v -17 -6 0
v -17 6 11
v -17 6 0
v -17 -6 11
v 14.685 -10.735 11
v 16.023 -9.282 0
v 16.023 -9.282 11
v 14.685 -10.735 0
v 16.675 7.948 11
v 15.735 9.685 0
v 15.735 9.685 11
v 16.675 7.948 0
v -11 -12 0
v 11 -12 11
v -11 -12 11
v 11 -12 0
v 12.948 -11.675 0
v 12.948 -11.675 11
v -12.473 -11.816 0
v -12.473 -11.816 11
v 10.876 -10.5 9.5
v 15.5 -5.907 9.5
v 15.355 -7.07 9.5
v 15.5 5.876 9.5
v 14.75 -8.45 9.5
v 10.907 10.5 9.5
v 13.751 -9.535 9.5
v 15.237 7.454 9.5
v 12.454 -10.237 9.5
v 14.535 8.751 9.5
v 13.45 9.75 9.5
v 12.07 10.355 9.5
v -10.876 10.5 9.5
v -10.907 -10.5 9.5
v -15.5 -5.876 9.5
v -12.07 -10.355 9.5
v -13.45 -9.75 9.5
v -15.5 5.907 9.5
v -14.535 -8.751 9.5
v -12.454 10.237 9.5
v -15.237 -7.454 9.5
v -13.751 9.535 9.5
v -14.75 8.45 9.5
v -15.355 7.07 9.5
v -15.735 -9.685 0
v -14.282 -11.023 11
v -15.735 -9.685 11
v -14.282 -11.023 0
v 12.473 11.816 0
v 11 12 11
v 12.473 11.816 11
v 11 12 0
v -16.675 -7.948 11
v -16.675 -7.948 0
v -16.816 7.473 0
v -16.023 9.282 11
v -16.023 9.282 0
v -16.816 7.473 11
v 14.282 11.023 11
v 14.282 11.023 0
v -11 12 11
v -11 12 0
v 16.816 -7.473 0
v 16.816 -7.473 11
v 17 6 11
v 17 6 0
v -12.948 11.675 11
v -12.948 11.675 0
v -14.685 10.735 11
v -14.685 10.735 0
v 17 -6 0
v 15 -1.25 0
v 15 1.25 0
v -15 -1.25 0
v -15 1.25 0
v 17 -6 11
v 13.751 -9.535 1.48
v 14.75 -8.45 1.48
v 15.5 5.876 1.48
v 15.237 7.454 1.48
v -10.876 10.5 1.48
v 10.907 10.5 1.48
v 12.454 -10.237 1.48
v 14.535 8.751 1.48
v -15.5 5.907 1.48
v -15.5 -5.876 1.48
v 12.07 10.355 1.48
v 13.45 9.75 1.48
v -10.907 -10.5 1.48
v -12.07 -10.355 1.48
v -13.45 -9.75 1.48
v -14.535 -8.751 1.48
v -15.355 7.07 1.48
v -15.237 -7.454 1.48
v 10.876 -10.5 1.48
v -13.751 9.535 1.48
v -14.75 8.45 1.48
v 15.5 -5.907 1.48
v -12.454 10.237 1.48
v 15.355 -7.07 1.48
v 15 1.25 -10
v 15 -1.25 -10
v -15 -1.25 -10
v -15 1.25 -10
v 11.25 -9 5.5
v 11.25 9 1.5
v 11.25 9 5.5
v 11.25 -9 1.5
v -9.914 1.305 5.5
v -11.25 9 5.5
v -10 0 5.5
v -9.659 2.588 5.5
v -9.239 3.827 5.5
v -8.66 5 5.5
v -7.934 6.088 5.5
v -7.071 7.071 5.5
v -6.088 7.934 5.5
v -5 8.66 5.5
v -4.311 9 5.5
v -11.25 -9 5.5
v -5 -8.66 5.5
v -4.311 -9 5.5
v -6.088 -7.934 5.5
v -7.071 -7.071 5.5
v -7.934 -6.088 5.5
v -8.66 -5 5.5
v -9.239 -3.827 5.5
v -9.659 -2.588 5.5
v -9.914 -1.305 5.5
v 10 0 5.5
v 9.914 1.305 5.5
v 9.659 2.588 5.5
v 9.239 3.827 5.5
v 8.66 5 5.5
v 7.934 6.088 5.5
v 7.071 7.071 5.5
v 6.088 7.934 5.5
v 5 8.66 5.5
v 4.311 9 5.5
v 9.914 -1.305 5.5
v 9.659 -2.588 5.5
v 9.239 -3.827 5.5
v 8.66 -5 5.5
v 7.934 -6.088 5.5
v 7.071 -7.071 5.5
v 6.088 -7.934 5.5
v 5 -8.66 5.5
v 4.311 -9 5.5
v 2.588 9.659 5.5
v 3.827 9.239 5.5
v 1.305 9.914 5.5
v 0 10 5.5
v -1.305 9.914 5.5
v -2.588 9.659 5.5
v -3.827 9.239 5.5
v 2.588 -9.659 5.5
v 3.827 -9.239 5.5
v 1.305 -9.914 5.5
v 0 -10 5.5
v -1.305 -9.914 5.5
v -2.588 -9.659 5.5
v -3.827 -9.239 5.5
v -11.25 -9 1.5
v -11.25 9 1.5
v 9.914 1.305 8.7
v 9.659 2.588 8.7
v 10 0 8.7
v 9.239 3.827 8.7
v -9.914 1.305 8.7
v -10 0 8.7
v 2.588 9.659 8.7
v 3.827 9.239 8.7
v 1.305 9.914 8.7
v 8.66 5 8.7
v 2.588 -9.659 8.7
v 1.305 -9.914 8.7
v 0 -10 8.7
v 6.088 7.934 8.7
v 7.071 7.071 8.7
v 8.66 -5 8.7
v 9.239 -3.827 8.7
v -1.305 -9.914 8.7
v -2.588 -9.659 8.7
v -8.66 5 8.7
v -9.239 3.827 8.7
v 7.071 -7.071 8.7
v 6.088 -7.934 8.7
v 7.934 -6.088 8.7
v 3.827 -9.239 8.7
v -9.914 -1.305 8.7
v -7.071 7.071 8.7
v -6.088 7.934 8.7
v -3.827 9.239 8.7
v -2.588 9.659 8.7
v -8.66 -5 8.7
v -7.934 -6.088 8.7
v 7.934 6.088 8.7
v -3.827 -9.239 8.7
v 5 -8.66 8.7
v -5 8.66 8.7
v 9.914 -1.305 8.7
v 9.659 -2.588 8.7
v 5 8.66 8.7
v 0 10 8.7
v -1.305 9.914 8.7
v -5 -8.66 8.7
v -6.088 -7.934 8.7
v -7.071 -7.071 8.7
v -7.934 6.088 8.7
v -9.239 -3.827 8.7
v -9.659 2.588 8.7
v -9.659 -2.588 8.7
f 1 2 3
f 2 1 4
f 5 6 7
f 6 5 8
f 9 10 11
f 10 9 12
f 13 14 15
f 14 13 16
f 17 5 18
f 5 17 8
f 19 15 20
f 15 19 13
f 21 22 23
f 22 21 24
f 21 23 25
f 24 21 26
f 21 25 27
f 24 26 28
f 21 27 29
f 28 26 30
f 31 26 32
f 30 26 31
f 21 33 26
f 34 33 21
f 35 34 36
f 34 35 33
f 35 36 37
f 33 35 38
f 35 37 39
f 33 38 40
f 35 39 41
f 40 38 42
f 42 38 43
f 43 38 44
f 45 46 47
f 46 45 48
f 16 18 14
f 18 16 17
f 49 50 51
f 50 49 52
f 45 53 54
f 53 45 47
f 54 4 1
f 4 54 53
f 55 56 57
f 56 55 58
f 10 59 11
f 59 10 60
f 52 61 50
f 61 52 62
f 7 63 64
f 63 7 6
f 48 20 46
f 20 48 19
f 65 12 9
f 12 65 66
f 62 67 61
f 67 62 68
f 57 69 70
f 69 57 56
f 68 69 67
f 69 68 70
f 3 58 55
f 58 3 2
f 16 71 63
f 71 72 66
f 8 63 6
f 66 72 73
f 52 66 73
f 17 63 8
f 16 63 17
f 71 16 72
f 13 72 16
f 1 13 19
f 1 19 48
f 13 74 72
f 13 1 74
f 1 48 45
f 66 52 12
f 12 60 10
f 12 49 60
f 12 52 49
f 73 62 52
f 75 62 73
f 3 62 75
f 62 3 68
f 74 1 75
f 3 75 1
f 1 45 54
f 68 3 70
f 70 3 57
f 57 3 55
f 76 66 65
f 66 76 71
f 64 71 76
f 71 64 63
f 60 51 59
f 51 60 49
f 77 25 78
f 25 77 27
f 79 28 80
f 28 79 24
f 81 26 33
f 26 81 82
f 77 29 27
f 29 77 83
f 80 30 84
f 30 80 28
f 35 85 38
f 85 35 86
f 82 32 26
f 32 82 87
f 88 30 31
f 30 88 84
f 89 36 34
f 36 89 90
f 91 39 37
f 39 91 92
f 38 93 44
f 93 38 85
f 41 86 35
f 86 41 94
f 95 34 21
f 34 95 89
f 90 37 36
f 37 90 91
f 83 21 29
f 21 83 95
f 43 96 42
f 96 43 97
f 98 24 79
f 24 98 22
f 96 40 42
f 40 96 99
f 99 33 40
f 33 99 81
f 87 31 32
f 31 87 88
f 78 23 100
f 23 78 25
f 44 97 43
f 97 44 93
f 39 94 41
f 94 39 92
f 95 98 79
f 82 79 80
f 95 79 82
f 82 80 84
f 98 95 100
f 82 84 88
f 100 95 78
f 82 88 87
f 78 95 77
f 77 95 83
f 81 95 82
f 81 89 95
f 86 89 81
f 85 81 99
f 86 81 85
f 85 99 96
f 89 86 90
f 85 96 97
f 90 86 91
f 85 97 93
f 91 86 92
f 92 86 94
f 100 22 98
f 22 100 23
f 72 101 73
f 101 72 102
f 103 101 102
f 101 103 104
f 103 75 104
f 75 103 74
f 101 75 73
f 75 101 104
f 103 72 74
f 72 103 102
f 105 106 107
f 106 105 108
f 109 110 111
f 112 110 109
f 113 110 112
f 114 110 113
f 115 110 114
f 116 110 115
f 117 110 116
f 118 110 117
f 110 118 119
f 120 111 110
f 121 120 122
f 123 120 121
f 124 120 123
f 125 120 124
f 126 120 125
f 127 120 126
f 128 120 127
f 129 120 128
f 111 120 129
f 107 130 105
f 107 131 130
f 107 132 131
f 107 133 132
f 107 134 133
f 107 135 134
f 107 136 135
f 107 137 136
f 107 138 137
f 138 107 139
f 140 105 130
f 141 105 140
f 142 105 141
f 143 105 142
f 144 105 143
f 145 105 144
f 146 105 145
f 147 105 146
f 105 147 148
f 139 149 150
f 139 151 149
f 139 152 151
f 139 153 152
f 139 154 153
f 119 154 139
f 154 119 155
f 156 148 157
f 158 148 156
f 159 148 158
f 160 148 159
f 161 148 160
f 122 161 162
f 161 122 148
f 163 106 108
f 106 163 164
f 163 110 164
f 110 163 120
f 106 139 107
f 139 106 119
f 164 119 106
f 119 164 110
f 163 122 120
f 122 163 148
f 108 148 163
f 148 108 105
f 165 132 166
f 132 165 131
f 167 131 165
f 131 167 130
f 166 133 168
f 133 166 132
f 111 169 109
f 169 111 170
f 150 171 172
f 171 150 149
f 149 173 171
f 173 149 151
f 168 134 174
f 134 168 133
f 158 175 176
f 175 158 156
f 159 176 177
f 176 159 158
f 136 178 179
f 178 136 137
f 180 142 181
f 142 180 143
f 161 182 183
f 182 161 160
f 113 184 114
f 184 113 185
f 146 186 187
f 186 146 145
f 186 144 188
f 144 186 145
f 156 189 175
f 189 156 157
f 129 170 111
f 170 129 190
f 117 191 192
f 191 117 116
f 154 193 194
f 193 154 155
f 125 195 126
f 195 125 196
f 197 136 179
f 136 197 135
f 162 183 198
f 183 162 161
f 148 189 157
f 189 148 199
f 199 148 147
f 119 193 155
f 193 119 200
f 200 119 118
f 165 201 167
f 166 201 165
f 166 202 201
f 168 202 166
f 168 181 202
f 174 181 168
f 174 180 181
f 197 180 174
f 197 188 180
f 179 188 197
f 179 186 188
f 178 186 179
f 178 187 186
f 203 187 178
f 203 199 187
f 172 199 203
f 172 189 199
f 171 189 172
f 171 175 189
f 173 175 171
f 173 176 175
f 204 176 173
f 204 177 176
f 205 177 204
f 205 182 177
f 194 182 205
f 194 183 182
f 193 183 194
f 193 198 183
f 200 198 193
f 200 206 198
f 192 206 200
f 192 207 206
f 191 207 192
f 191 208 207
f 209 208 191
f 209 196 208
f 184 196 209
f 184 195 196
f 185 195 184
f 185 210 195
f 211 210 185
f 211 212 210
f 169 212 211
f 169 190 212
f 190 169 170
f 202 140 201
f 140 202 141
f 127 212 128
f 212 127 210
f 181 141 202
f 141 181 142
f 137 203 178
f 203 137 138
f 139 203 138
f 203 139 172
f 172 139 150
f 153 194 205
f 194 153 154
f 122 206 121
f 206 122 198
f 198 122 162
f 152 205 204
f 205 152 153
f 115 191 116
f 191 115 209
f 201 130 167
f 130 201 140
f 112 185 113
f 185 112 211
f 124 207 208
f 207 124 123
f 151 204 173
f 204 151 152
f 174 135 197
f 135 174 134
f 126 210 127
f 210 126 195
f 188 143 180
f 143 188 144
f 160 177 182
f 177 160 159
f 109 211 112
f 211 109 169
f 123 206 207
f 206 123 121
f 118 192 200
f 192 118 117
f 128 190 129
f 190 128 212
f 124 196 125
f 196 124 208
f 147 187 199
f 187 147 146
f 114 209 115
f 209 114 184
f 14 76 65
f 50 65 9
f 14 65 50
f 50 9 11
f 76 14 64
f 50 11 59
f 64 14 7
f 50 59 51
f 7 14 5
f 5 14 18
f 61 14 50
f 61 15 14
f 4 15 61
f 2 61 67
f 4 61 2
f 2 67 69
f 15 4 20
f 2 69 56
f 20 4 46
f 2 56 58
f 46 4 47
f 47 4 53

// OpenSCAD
// ============================================================
// P.A.N.D.U — Helmet Node Casing (v3: Euroslot mount, PERKIRAAN)
// Komponen: ESP32-C3 SuperMini + CR2032 (badan modul)
//           + TTP223 (pad terpisah, kabel flex ke harness webbing)
// ============================================================
// MOUNTING: pakai slot aksesoris universal "Euroslot" di sisi shell
// helm (lebar 30mm, standar lintas-brand -- earmuff/faceshield pakai
// slot yang sama). Ini titik pasang AMAN krn di luar zona benturan
// crown (celah shell-harness 25-32mm wajib kosong, ANSI Z89.1).
//
// TTP223 TIDAK lagi di badan modul ini -- ditaruh di pad kecil
// terpisah + kabel flex pendek ke webbing harness (titik yang
// beneran deket/nempel kepala). Nggak dimodelkan detail di sini,
// cuma catatan posisi.
//
// PERKIRAAN yang masih perlu diverifikasi:
//   - Kedalaman & ketebalan slot Euroslot (lebar 30mm relatif pasti,
//     tapi depth/thickness tab blade belum ketemu data resminya)
//   - Panjang kabel flex TTP223 ke titik kontak harness
// ============================================================

/* [Render Control] */
explode_factor = 0; // [0:0.1:3]
dxf_view = "none"; // [none, front, top, side]

/* [Dimensi Casing utama (mm)] */
case_w   = 34;   // badan modul, muat ESP32-C3 SuperMini + CR2032
case_h   = 24;
case_t   = 11;  // direvisi dari 9mm -- 9mm nggak cukup buat MCU(4mm)+baterai(3.2mm)+dinding 2x
corner_r = 6;
wall     = 1.5;
lid_t    = 1.5;

/* [Euroslot tab (PERKIRAAN kedalaman & tebal, lebar 30mm cukup pasti)] */
slot_w = 30;   // standar Euroslot, lintas-brand
slot_t = 2.5;  // PERKIRAAN -- verifikasi ke slot fisik
slot_depth = 10; // PERKIRAAN -- seberapa dalam tab masuk ke slot

/* [ESP32-C3 SuperMini] */
mcu_w = 22.5;
mcu_h = 18;
mcu_t = 4;

/* [CR2032] */
batt_d = 20;
batt_t = 3.2;

avail_w = case_w - wall*2;
avail_h = case_h - wall*2;

module rounded_rect(w, h, r) {
    offset(r = r) offset(delta = -r) square([w, h], center = true);
}

module bottom_shell() {
    shell_h = case_t - lid_t;
    difference() {
        linear_extrude(height = shell_h) rounded_rect(case_w, case_h, corner_r);
        translate([0, 0, wall - 0.02])
            linear_extrude(height = shell_h)
                offset(delta = -wall) rounded_rect(case_w, case_h, corner_r);
    }
}

module lid() {
    linear_extrude(height = lid_t) rounded_rect(case_w, case_h, corner_r);
}

// Tab Euroslot -- blade pipih menonjol dari belakang casing
module euroslot_tab() {
    translate([0, 0, -slot_depth/2])
        cube([slot_w, slot_t, slot_depth], center = true);
}

module mcu_board() {
    translate([0, 0, 0])
        cube([mcu_w, mcu_h, mcu_t], center = true);
}

module battery() {
    translate([0, 0, 0])
        cylinder(d = batt_d, h = batt_t, center = true, $fn = 48);
}

module assembly(explode = explode_factor) {
    shell_h = case_t - lid_t;

    color("SteelBlue") bottom_shell();
    color("Gray") euroslot_tab();

    translate([0, 0, wall + mcu_t/2 + explode*10])
        color("LimeGreen") mcu_board();

    translate([0, 0, wall + mcu_t + batt_t/2 + explode*20])
        color("Orange") battery();

    translate([0, 0, shell_h + explode*35])
        color([0.27, 0.31, 0.47, 0.85]) lid();
}

if (dxf_view == "front") {
    projection(cut = false) assembly(0);
} else if (dxf_view == "top") {
    projection(cut = false) rotate([90, 0, 0]) assembly(0);
} else if (dxf_view == "side") {
    projection(cut = false) rotate([0, 90, 0]) assembly(0);
} else {
    assembly();
}

// ---- Cek dimensi (MCU + baterai ditumpuk krn slot mount = casing sempit) ----
w_fits = max(mcu_w, batt_d) <= avail_w;
h_fits = max(mcu_h, batt_d) <= avail_h;
t_needed = wall + mcu_t + batt_t + wall;
t_fits = t_needed <= case_t;
slot_ok = slot_w <= case_w;

echo(str("=== HASIL CEK DIMENSI HELMET NODE (v3, Euroslot mount, PERKIRAAN) ==="));
echo(str("Lebar casing: ", case_w, " mm | komponen terlebar: ", max(mcu_w, batt_d), " mm -- ",
    w_fits ? "MUAT" : "TERLALU SEMPIT"));
echo(str("Tinggi casing: ", case_h, " mm | komponen tertinggi: ", max(mcu_h, batt_d), " mm -- ",
    h_fits ? "MUAT" : "TERLALU PENDEK"));
echo(str("Tebal casing: ", case_t, " mm | butuh (MCU+baterai ditumpuk+dinding): ", t_needed, " mm -- ",
    t_fits ? "MUAT" : "TERLALU TIPIS, naikkan case_t"));
echo(str("Slot Euroslot 30mm muat di lebar casing ", case_w, "mm: ", slot_ok ? "YA" : "TIDAK, lebarkan case_w"));
echo("CATATAN: slot_t & slot_depth masih PERKIRAAN. TTP223 dipasang terpisah (pad + flex cable ke harness webbing), tidak termodelkan di file ini.");
